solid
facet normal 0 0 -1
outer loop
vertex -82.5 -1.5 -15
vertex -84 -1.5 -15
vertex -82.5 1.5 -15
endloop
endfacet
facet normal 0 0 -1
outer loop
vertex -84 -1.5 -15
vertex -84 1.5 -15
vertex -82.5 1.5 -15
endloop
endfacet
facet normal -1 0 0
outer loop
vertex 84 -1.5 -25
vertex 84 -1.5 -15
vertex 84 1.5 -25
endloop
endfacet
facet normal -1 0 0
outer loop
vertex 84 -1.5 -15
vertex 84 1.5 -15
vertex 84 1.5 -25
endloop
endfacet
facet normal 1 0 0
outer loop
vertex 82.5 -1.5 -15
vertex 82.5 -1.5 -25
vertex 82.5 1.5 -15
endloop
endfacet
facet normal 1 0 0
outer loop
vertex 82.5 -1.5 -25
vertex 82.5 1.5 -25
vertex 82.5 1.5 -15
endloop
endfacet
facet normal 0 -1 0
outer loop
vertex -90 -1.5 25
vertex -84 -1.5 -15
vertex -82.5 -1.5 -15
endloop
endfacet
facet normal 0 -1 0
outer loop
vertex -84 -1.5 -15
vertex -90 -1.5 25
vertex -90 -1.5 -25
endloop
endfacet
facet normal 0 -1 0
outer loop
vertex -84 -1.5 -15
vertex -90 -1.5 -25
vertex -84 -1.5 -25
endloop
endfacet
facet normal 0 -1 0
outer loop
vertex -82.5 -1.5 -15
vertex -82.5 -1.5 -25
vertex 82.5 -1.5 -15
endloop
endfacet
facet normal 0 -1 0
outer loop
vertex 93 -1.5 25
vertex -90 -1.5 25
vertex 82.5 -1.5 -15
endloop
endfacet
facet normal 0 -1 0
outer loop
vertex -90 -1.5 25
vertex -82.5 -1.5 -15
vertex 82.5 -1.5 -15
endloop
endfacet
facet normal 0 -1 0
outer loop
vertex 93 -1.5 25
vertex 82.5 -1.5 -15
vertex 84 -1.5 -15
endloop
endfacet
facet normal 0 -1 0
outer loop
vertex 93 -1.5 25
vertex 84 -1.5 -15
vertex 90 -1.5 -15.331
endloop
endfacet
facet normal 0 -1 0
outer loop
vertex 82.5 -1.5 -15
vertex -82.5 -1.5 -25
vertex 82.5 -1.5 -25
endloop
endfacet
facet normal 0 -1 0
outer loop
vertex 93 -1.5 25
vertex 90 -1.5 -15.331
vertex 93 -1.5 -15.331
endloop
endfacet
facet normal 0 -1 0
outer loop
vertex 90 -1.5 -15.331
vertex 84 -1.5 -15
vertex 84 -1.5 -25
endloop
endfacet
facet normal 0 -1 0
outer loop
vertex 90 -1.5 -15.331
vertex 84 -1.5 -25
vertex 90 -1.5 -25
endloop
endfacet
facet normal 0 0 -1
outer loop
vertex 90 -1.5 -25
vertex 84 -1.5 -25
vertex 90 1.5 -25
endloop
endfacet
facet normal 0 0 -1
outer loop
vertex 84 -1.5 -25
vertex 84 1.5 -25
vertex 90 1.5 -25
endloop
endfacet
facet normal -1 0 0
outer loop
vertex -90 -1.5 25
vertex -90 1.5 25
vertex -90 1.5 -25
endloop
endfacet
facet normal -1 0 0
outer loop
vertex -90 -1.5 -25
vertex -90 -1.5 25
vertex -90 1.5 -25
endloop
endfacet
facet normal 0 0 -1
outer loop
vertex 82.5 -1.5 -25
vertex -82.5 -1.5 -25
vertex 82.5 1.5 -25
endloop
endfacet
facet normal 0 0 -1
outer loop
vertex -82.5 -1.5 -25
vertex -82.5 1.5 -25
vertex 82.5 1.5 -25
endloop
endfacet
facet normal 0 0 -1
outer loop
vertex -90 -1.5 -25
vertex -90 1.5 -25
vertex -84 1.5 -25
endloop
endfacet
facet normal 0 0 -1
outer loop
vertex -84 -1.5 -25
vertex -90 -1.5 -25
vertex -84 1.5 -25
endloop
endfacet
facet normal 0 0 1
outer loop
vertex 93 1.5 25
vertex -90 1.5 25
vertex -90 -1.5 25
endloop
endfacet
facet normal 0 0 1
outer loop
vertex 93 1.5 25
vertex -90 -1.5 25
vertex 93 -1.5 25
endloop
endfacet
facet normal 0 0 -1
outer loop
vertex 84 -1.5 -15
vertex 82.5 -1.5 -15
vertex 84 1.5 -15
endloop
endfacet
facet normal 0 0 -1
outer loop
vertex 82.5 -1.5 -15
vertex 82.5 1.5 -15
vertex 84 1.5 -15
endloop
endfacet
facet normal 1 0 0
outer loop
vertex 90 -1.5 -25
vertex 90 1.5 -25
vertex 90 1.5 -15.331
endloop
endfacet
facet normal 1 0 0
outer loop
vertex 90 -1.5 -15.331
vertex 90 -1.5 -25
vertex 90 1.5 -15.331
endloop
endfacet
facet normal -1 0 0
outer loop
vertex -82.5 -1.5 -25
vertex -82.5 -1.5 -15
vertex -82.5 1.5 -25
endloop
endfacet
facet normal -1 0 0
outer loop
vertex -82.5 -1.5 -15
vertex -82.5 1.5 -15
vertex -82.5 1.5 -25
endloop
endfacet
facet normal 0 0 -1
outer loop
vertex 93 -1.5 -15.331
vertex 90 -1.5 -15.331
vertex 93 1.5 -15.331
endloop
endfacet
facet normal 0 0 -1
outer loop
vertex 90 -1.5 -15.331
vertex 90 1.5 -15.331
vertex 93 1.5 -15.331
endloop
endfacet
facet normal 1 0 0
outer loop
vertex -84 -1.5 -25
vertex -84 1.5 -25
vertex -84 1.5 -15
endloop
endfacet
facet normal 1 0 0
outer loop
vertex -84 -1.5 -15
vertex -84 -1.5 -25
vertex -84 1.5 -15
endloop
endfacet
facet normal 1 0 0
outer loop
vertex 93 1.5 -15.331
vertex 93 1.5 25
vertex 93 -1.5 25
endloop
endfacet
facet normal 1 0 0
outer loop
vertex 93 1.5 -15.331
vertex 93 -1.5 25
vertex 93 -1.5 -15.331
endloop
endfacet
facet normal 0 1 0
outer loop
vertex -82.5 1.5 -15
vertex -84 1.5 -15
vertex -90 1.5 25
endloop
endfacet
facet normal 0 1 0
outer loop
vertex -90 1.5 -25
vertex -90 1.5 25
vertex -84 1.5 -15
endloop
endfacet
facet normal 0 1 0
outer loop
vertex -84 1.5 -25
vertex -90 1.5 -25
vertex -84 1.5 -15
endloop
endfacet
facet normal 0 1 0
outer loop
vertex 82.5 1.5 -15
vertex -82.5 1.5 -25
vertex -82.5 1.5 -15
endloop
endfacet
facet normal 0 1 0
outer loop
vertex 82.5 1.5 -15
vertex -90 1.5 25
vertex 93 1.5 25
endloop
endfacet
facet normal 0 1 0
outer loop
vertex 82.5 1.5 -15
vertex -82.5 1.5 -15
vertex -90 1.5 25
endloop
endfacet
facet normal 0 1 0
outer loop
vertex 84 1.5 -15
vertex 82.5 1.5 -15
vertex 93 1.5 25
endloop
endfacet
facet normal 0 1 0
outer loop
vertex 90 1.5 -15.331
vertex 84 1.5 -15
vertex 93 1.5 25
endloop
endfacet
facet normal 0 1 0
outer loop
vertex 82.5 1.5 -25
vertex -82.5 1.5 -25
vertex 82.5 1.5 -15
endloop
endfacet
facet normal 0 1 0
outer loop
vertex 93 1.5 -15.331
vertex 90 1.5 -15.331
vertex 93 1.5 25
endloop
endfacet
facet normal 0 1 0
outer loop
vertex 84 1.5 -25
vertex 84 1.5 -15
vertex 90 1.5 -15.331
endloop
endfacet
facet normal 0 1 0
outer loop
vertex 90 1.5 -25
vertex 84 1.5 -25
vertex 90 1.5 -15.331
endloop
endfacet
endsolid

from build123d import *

# Parameters (mm, degrees)
BOSS_EXTRUDE1_DEPTH = 1.5
SKETCH2_W           = 3
SKETCH2_H           = 40.331406252
BOSS_EXTRUDE2_DEPTH = 1.5


with BuildPart() as part:
    # Sketch1 → Boss-Extrude1 (new, symmetric)
    with BuildSketch(Plane(origin=(0, 0, 0), x_dir=(1, 0, 0), z_dir=(0, 1, 0))):
        Polygon((-84, 25), (-84, 15), (-82.5, 15), (-82.5, 25), (82.5, 25), (82.5, 15), (84, 15), (84, 25), (90, 25), (90, -25), (-90, -25), (-90, 25), align=None)
    extrude(amount=BOSS_EXTRUDE1_DEPTH, both=True)

    # Sketch2 → Boss-Extrude2 (add, symmetric)
    with BuildSketch(Plane(origin=(0, 0, 0), x_dir=(1, 0, 0), z_dir=(0, 1, 0))):
        with Locations((91.5, -4.834296874)):
            Rectangle(SKETCH2_W, SKETCH2_H)
    extrude(amount=BOSS_EXTRUDE2_DEPTH, both=True)


solid = part.part
